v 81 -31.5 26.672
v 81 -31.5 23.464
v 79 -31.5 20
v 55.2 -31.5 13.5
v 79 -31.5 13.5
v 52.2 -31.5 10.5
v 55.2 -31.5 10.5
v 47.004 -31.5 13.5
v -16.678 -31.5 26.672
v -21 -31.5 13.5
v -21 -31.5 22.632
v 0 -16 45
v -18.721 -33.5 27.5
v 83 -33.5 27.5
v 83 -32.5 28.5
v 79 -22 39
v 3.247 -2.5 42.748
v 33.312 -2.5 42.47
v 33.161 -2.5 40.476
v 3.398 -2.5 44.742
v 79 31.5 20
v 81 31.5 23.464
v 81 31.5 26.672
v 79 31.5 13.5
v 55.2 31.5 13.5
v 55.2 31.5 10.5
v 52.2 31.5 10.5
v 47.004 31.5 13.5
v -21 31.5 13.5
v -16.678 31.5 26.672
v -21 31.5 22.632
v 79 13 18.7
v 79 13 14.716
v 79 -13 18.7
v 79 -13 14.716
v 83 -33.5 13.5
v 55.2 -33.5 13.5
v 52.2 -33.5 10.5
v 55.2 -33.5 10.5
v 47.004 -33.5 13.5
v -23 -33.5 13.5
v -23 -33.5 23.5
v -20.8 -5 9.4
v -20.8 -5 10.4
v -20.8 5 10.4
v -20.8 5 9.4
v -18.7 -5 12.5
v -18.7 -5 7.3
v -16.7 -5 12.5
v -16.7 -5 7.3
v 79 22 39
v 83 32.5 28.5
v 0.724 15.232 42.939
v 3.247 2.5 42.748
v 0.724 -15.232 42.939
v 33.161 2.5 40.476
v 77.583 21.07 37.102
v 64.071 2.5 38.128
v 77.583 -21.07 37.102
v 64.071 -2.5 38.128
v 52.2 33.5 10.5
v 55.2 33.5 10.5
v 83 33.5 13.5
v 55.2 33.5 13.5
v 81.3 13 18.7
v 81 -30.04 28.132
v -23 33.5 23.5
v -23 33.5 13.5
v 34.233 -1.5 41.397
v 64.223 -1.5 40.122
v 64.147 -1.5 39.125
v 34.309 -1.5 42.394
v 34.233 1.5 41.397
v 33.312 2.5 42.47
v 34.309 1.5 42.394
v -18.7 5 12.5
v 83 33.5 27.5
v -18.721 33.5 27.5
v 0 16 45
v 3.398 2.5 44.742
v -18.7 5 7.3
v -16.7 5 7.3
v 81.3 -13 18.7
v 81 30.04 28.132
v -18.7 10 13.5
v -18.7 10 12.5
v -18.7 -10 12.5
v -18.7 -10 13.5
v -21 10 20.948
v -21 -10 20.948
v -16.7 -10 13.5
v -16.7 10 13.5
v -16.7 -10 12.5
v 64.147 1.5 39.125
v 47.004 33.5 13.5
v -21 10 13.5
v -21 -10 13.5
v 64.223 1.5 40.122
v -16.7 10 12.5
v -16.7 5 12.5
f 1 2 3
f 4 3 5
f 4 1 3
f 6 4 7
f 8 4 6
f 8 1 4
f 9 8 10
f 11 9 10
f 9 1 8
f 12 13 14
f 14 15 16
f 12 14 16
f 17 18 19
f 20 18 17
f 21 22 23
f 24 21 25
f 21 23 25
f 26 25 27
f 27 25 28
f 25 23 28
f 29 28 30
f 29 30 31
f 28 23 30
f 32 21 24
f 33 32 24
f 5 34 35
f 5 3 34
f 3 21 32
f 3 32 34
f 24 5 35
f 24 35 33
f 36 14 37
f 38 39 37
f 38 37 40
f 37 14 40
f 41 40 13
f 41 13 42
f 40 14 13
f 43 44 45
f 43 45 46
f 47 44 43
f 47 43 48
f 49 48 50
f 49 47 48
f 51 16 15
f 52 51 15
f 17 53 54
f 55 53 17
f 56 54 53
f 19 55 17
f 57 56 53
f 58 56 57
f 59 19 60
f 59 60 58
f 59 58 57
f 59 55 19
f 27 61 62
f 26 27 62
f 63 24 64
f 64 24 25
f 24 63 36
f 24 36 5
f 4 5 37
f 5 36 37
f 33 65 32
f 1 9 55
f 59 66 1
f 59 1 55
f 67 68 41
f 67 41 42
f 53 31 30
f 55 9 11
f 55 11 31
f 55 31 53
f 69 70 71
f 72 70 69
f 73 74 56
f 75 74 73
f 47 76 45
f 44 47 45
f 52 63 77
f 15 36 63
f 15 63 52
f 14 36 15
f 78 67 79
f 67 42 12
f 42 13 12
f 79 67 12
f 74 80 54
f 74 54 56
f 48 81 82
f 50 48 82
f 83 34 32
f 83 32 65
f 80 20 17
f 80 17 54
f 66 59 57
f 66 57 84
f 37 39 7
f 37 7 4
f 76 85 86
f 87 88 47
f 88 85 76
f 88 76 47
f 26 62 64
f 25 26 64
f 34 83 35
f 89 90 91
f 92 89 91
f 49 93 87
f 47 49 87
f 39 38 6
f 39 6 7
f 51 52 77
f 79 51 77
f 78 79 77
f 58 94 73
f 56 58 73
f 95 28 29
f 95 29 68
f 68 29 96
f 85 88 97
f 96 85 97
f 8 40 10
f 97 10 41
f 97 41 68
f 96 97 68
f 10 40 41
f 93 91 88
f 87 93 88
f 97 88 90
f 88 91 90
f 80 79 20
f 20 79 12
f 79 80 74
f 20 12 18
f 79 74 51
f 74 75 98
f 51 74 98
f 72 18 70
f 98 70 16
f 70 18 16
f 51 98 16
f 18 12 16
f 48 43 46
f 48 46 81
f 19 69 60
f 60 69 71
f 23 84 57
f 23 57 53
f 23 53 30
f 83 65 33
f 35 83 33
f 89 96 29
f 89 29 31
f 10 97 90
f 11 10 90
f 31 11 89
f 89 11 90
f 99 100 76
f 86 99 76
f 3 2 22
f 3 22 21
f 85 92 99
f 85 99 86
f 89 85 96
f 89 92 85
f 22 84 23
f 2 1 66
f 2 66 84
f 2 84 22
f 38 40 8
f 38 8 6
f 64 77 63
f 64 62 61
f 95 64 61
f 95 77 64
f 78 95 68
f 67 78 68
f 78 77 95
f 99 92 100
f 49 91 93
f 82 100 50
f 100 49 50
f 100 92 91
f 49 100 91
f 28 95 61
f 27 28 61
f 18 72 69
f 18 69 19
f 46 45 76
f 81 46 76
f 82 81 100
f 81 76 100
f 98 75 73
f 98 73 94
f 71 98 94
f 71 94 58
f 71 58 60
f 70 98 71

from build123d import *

# Parameters (mm, degrees)
PAD003_DEPTH    = 33.5
SKETCH015_W     = 120
SKETCH015_H     = 100
POCKET011_DEPTH = 123.001
THICKNESS_T     = -2
PAD004_DEPTH    = 31.5
POCKET012_DEPTH = 13
PAD005_DEPTH    = 10
PAD006_DEPTH    = 5
PAD007_DEPTH    = 2
POCKET013_DEPTH = 5
CHAMFER001_SIZE = 1


with BuildPart() as part:
    # Sketch014 → Pad003 (new body, symmetric)
    with BuildSketch(Plane.XZ):
        Polygon((-23, 23.5), (0, 45), (79, 39), (83, 28.5), (83, 13.5), (-23, 13.5), align=None)
    extrude(amount=PAD003_DEPTH, both=True)

    # Sketch015 (on DatumPlane) → Pocket011 (cut, through all)
    with BuildSketch(Plane.YZ.offset(100)):
        with Locations((0, 16.75)):
            Rectangle(SKETCH015_W, SKETCH015_H)
        Polygon((-33.5, 27.5), (-7.25, 53.75), (7.25, 53.75), (33.5, 27.5), (33.5, 13.5), (-33.5, 13.5), align=None, mode=Mode.SUBTRACT)
    extrude(amount=-POCKET011_DEPTH, mode=Mode.SUBTRACT)

    # Thickness
    thickness_openings = [part.faces().sort_by_distance(p)[0] for p in [
        (30, 0, 13.5),
    ]]
    offset(amount=THICKNESS_T, openings=thickness_openings)

    # Sketch020 (on DatumPlane) → Pad004 (join, symmetric)
    with BuildSketch(Plane.XZ):
        Polygon((83, 26.928203), (79, 20), (79, 13.5), (83, 13.5), align=None)
    extrude(amount=PAD004_DEPTH, both=True)

    # Sketch021 (on DatumPlane) → Pocket012 (cut, symmetric)
    with BuildSketch(Plane.XZ):
        Polygon((78.817394, 18.7), (81.3, 18.7), (78.817394, 14.4), align=None)
    extrude(amount=POCKET012_DEPTH, both=True, mode=Mode.SUBTRACT)

    # Sketch022 (on DatumPlane) → Pad005 (join, symmetric)
    with BuildSketch(Plane.XZ):
        Polygon((-21, 20.947818), (-16.7, 13.5), (-16.7, 12.5), (-18.7, 12.5), (-18.7, 13.5), (-21, 13.5), align=None)
    extrude(amount=PAD005_DEPTH, both=True)

    # Sketch023 (on DatumPlane) → Pad006 (join, symmetric)
    with BuildSketch(Plane.XZ):
        Polygon((-18.7, 13.5), (-18.7, 12.5), (-20.8, 10.4), (-20.8, 9.4), (-18.7, 7.3), (-16.7, 7.3), (-16.7, 13.5), align=None)
    extrude(amount=PAD006_DEPTH, both=True)

    # Sketch024 (on Face6 of Pad006) → Pad007 (join)
    with BuildSketch(Plane.XZ.offset(33.5)):
        Polygon((55.2, 13.5), (47.003848, 13.5), (52.2, 10.5), (55.2, 10.5), align=None)
    pad007 = extrude(amount=-PAD007_DEPTH)

    # Mirrored004: Pad007 across XZ
    add(pad007.mirror(Plane.XZ))

    # Sketch025 (on DatumPlane) → Pocket013 (cut)
    with BuildSketch(Plane(origin=(3.39812, 0, 44.741915), x_dir=(0.997128, 0, -0.075731), z_dir=(0.075731, 0, 0.997128))):
        Polygon((0, 2.5), (30, 2.5), (31, 1.5), (61, 1.5), (61, -1.5), (31, -1.5), (30, -2.5), (0, -2.5), align=None)
    extrude(amount=-POCKET013_DEPTH, mode=Mode.SUBTRACT)

    # Chamfer001
    chamfer001_edges = [part.edges().sort_by_distance(p)[0] for p in [
        (49.114558, 1.5, 39.26402),
        (49.114558, -1.5, 39.26402),
    ]]
    chamfer(chamfer001_edges, length=CHAMFER001_SIZE)


solid = part.part
